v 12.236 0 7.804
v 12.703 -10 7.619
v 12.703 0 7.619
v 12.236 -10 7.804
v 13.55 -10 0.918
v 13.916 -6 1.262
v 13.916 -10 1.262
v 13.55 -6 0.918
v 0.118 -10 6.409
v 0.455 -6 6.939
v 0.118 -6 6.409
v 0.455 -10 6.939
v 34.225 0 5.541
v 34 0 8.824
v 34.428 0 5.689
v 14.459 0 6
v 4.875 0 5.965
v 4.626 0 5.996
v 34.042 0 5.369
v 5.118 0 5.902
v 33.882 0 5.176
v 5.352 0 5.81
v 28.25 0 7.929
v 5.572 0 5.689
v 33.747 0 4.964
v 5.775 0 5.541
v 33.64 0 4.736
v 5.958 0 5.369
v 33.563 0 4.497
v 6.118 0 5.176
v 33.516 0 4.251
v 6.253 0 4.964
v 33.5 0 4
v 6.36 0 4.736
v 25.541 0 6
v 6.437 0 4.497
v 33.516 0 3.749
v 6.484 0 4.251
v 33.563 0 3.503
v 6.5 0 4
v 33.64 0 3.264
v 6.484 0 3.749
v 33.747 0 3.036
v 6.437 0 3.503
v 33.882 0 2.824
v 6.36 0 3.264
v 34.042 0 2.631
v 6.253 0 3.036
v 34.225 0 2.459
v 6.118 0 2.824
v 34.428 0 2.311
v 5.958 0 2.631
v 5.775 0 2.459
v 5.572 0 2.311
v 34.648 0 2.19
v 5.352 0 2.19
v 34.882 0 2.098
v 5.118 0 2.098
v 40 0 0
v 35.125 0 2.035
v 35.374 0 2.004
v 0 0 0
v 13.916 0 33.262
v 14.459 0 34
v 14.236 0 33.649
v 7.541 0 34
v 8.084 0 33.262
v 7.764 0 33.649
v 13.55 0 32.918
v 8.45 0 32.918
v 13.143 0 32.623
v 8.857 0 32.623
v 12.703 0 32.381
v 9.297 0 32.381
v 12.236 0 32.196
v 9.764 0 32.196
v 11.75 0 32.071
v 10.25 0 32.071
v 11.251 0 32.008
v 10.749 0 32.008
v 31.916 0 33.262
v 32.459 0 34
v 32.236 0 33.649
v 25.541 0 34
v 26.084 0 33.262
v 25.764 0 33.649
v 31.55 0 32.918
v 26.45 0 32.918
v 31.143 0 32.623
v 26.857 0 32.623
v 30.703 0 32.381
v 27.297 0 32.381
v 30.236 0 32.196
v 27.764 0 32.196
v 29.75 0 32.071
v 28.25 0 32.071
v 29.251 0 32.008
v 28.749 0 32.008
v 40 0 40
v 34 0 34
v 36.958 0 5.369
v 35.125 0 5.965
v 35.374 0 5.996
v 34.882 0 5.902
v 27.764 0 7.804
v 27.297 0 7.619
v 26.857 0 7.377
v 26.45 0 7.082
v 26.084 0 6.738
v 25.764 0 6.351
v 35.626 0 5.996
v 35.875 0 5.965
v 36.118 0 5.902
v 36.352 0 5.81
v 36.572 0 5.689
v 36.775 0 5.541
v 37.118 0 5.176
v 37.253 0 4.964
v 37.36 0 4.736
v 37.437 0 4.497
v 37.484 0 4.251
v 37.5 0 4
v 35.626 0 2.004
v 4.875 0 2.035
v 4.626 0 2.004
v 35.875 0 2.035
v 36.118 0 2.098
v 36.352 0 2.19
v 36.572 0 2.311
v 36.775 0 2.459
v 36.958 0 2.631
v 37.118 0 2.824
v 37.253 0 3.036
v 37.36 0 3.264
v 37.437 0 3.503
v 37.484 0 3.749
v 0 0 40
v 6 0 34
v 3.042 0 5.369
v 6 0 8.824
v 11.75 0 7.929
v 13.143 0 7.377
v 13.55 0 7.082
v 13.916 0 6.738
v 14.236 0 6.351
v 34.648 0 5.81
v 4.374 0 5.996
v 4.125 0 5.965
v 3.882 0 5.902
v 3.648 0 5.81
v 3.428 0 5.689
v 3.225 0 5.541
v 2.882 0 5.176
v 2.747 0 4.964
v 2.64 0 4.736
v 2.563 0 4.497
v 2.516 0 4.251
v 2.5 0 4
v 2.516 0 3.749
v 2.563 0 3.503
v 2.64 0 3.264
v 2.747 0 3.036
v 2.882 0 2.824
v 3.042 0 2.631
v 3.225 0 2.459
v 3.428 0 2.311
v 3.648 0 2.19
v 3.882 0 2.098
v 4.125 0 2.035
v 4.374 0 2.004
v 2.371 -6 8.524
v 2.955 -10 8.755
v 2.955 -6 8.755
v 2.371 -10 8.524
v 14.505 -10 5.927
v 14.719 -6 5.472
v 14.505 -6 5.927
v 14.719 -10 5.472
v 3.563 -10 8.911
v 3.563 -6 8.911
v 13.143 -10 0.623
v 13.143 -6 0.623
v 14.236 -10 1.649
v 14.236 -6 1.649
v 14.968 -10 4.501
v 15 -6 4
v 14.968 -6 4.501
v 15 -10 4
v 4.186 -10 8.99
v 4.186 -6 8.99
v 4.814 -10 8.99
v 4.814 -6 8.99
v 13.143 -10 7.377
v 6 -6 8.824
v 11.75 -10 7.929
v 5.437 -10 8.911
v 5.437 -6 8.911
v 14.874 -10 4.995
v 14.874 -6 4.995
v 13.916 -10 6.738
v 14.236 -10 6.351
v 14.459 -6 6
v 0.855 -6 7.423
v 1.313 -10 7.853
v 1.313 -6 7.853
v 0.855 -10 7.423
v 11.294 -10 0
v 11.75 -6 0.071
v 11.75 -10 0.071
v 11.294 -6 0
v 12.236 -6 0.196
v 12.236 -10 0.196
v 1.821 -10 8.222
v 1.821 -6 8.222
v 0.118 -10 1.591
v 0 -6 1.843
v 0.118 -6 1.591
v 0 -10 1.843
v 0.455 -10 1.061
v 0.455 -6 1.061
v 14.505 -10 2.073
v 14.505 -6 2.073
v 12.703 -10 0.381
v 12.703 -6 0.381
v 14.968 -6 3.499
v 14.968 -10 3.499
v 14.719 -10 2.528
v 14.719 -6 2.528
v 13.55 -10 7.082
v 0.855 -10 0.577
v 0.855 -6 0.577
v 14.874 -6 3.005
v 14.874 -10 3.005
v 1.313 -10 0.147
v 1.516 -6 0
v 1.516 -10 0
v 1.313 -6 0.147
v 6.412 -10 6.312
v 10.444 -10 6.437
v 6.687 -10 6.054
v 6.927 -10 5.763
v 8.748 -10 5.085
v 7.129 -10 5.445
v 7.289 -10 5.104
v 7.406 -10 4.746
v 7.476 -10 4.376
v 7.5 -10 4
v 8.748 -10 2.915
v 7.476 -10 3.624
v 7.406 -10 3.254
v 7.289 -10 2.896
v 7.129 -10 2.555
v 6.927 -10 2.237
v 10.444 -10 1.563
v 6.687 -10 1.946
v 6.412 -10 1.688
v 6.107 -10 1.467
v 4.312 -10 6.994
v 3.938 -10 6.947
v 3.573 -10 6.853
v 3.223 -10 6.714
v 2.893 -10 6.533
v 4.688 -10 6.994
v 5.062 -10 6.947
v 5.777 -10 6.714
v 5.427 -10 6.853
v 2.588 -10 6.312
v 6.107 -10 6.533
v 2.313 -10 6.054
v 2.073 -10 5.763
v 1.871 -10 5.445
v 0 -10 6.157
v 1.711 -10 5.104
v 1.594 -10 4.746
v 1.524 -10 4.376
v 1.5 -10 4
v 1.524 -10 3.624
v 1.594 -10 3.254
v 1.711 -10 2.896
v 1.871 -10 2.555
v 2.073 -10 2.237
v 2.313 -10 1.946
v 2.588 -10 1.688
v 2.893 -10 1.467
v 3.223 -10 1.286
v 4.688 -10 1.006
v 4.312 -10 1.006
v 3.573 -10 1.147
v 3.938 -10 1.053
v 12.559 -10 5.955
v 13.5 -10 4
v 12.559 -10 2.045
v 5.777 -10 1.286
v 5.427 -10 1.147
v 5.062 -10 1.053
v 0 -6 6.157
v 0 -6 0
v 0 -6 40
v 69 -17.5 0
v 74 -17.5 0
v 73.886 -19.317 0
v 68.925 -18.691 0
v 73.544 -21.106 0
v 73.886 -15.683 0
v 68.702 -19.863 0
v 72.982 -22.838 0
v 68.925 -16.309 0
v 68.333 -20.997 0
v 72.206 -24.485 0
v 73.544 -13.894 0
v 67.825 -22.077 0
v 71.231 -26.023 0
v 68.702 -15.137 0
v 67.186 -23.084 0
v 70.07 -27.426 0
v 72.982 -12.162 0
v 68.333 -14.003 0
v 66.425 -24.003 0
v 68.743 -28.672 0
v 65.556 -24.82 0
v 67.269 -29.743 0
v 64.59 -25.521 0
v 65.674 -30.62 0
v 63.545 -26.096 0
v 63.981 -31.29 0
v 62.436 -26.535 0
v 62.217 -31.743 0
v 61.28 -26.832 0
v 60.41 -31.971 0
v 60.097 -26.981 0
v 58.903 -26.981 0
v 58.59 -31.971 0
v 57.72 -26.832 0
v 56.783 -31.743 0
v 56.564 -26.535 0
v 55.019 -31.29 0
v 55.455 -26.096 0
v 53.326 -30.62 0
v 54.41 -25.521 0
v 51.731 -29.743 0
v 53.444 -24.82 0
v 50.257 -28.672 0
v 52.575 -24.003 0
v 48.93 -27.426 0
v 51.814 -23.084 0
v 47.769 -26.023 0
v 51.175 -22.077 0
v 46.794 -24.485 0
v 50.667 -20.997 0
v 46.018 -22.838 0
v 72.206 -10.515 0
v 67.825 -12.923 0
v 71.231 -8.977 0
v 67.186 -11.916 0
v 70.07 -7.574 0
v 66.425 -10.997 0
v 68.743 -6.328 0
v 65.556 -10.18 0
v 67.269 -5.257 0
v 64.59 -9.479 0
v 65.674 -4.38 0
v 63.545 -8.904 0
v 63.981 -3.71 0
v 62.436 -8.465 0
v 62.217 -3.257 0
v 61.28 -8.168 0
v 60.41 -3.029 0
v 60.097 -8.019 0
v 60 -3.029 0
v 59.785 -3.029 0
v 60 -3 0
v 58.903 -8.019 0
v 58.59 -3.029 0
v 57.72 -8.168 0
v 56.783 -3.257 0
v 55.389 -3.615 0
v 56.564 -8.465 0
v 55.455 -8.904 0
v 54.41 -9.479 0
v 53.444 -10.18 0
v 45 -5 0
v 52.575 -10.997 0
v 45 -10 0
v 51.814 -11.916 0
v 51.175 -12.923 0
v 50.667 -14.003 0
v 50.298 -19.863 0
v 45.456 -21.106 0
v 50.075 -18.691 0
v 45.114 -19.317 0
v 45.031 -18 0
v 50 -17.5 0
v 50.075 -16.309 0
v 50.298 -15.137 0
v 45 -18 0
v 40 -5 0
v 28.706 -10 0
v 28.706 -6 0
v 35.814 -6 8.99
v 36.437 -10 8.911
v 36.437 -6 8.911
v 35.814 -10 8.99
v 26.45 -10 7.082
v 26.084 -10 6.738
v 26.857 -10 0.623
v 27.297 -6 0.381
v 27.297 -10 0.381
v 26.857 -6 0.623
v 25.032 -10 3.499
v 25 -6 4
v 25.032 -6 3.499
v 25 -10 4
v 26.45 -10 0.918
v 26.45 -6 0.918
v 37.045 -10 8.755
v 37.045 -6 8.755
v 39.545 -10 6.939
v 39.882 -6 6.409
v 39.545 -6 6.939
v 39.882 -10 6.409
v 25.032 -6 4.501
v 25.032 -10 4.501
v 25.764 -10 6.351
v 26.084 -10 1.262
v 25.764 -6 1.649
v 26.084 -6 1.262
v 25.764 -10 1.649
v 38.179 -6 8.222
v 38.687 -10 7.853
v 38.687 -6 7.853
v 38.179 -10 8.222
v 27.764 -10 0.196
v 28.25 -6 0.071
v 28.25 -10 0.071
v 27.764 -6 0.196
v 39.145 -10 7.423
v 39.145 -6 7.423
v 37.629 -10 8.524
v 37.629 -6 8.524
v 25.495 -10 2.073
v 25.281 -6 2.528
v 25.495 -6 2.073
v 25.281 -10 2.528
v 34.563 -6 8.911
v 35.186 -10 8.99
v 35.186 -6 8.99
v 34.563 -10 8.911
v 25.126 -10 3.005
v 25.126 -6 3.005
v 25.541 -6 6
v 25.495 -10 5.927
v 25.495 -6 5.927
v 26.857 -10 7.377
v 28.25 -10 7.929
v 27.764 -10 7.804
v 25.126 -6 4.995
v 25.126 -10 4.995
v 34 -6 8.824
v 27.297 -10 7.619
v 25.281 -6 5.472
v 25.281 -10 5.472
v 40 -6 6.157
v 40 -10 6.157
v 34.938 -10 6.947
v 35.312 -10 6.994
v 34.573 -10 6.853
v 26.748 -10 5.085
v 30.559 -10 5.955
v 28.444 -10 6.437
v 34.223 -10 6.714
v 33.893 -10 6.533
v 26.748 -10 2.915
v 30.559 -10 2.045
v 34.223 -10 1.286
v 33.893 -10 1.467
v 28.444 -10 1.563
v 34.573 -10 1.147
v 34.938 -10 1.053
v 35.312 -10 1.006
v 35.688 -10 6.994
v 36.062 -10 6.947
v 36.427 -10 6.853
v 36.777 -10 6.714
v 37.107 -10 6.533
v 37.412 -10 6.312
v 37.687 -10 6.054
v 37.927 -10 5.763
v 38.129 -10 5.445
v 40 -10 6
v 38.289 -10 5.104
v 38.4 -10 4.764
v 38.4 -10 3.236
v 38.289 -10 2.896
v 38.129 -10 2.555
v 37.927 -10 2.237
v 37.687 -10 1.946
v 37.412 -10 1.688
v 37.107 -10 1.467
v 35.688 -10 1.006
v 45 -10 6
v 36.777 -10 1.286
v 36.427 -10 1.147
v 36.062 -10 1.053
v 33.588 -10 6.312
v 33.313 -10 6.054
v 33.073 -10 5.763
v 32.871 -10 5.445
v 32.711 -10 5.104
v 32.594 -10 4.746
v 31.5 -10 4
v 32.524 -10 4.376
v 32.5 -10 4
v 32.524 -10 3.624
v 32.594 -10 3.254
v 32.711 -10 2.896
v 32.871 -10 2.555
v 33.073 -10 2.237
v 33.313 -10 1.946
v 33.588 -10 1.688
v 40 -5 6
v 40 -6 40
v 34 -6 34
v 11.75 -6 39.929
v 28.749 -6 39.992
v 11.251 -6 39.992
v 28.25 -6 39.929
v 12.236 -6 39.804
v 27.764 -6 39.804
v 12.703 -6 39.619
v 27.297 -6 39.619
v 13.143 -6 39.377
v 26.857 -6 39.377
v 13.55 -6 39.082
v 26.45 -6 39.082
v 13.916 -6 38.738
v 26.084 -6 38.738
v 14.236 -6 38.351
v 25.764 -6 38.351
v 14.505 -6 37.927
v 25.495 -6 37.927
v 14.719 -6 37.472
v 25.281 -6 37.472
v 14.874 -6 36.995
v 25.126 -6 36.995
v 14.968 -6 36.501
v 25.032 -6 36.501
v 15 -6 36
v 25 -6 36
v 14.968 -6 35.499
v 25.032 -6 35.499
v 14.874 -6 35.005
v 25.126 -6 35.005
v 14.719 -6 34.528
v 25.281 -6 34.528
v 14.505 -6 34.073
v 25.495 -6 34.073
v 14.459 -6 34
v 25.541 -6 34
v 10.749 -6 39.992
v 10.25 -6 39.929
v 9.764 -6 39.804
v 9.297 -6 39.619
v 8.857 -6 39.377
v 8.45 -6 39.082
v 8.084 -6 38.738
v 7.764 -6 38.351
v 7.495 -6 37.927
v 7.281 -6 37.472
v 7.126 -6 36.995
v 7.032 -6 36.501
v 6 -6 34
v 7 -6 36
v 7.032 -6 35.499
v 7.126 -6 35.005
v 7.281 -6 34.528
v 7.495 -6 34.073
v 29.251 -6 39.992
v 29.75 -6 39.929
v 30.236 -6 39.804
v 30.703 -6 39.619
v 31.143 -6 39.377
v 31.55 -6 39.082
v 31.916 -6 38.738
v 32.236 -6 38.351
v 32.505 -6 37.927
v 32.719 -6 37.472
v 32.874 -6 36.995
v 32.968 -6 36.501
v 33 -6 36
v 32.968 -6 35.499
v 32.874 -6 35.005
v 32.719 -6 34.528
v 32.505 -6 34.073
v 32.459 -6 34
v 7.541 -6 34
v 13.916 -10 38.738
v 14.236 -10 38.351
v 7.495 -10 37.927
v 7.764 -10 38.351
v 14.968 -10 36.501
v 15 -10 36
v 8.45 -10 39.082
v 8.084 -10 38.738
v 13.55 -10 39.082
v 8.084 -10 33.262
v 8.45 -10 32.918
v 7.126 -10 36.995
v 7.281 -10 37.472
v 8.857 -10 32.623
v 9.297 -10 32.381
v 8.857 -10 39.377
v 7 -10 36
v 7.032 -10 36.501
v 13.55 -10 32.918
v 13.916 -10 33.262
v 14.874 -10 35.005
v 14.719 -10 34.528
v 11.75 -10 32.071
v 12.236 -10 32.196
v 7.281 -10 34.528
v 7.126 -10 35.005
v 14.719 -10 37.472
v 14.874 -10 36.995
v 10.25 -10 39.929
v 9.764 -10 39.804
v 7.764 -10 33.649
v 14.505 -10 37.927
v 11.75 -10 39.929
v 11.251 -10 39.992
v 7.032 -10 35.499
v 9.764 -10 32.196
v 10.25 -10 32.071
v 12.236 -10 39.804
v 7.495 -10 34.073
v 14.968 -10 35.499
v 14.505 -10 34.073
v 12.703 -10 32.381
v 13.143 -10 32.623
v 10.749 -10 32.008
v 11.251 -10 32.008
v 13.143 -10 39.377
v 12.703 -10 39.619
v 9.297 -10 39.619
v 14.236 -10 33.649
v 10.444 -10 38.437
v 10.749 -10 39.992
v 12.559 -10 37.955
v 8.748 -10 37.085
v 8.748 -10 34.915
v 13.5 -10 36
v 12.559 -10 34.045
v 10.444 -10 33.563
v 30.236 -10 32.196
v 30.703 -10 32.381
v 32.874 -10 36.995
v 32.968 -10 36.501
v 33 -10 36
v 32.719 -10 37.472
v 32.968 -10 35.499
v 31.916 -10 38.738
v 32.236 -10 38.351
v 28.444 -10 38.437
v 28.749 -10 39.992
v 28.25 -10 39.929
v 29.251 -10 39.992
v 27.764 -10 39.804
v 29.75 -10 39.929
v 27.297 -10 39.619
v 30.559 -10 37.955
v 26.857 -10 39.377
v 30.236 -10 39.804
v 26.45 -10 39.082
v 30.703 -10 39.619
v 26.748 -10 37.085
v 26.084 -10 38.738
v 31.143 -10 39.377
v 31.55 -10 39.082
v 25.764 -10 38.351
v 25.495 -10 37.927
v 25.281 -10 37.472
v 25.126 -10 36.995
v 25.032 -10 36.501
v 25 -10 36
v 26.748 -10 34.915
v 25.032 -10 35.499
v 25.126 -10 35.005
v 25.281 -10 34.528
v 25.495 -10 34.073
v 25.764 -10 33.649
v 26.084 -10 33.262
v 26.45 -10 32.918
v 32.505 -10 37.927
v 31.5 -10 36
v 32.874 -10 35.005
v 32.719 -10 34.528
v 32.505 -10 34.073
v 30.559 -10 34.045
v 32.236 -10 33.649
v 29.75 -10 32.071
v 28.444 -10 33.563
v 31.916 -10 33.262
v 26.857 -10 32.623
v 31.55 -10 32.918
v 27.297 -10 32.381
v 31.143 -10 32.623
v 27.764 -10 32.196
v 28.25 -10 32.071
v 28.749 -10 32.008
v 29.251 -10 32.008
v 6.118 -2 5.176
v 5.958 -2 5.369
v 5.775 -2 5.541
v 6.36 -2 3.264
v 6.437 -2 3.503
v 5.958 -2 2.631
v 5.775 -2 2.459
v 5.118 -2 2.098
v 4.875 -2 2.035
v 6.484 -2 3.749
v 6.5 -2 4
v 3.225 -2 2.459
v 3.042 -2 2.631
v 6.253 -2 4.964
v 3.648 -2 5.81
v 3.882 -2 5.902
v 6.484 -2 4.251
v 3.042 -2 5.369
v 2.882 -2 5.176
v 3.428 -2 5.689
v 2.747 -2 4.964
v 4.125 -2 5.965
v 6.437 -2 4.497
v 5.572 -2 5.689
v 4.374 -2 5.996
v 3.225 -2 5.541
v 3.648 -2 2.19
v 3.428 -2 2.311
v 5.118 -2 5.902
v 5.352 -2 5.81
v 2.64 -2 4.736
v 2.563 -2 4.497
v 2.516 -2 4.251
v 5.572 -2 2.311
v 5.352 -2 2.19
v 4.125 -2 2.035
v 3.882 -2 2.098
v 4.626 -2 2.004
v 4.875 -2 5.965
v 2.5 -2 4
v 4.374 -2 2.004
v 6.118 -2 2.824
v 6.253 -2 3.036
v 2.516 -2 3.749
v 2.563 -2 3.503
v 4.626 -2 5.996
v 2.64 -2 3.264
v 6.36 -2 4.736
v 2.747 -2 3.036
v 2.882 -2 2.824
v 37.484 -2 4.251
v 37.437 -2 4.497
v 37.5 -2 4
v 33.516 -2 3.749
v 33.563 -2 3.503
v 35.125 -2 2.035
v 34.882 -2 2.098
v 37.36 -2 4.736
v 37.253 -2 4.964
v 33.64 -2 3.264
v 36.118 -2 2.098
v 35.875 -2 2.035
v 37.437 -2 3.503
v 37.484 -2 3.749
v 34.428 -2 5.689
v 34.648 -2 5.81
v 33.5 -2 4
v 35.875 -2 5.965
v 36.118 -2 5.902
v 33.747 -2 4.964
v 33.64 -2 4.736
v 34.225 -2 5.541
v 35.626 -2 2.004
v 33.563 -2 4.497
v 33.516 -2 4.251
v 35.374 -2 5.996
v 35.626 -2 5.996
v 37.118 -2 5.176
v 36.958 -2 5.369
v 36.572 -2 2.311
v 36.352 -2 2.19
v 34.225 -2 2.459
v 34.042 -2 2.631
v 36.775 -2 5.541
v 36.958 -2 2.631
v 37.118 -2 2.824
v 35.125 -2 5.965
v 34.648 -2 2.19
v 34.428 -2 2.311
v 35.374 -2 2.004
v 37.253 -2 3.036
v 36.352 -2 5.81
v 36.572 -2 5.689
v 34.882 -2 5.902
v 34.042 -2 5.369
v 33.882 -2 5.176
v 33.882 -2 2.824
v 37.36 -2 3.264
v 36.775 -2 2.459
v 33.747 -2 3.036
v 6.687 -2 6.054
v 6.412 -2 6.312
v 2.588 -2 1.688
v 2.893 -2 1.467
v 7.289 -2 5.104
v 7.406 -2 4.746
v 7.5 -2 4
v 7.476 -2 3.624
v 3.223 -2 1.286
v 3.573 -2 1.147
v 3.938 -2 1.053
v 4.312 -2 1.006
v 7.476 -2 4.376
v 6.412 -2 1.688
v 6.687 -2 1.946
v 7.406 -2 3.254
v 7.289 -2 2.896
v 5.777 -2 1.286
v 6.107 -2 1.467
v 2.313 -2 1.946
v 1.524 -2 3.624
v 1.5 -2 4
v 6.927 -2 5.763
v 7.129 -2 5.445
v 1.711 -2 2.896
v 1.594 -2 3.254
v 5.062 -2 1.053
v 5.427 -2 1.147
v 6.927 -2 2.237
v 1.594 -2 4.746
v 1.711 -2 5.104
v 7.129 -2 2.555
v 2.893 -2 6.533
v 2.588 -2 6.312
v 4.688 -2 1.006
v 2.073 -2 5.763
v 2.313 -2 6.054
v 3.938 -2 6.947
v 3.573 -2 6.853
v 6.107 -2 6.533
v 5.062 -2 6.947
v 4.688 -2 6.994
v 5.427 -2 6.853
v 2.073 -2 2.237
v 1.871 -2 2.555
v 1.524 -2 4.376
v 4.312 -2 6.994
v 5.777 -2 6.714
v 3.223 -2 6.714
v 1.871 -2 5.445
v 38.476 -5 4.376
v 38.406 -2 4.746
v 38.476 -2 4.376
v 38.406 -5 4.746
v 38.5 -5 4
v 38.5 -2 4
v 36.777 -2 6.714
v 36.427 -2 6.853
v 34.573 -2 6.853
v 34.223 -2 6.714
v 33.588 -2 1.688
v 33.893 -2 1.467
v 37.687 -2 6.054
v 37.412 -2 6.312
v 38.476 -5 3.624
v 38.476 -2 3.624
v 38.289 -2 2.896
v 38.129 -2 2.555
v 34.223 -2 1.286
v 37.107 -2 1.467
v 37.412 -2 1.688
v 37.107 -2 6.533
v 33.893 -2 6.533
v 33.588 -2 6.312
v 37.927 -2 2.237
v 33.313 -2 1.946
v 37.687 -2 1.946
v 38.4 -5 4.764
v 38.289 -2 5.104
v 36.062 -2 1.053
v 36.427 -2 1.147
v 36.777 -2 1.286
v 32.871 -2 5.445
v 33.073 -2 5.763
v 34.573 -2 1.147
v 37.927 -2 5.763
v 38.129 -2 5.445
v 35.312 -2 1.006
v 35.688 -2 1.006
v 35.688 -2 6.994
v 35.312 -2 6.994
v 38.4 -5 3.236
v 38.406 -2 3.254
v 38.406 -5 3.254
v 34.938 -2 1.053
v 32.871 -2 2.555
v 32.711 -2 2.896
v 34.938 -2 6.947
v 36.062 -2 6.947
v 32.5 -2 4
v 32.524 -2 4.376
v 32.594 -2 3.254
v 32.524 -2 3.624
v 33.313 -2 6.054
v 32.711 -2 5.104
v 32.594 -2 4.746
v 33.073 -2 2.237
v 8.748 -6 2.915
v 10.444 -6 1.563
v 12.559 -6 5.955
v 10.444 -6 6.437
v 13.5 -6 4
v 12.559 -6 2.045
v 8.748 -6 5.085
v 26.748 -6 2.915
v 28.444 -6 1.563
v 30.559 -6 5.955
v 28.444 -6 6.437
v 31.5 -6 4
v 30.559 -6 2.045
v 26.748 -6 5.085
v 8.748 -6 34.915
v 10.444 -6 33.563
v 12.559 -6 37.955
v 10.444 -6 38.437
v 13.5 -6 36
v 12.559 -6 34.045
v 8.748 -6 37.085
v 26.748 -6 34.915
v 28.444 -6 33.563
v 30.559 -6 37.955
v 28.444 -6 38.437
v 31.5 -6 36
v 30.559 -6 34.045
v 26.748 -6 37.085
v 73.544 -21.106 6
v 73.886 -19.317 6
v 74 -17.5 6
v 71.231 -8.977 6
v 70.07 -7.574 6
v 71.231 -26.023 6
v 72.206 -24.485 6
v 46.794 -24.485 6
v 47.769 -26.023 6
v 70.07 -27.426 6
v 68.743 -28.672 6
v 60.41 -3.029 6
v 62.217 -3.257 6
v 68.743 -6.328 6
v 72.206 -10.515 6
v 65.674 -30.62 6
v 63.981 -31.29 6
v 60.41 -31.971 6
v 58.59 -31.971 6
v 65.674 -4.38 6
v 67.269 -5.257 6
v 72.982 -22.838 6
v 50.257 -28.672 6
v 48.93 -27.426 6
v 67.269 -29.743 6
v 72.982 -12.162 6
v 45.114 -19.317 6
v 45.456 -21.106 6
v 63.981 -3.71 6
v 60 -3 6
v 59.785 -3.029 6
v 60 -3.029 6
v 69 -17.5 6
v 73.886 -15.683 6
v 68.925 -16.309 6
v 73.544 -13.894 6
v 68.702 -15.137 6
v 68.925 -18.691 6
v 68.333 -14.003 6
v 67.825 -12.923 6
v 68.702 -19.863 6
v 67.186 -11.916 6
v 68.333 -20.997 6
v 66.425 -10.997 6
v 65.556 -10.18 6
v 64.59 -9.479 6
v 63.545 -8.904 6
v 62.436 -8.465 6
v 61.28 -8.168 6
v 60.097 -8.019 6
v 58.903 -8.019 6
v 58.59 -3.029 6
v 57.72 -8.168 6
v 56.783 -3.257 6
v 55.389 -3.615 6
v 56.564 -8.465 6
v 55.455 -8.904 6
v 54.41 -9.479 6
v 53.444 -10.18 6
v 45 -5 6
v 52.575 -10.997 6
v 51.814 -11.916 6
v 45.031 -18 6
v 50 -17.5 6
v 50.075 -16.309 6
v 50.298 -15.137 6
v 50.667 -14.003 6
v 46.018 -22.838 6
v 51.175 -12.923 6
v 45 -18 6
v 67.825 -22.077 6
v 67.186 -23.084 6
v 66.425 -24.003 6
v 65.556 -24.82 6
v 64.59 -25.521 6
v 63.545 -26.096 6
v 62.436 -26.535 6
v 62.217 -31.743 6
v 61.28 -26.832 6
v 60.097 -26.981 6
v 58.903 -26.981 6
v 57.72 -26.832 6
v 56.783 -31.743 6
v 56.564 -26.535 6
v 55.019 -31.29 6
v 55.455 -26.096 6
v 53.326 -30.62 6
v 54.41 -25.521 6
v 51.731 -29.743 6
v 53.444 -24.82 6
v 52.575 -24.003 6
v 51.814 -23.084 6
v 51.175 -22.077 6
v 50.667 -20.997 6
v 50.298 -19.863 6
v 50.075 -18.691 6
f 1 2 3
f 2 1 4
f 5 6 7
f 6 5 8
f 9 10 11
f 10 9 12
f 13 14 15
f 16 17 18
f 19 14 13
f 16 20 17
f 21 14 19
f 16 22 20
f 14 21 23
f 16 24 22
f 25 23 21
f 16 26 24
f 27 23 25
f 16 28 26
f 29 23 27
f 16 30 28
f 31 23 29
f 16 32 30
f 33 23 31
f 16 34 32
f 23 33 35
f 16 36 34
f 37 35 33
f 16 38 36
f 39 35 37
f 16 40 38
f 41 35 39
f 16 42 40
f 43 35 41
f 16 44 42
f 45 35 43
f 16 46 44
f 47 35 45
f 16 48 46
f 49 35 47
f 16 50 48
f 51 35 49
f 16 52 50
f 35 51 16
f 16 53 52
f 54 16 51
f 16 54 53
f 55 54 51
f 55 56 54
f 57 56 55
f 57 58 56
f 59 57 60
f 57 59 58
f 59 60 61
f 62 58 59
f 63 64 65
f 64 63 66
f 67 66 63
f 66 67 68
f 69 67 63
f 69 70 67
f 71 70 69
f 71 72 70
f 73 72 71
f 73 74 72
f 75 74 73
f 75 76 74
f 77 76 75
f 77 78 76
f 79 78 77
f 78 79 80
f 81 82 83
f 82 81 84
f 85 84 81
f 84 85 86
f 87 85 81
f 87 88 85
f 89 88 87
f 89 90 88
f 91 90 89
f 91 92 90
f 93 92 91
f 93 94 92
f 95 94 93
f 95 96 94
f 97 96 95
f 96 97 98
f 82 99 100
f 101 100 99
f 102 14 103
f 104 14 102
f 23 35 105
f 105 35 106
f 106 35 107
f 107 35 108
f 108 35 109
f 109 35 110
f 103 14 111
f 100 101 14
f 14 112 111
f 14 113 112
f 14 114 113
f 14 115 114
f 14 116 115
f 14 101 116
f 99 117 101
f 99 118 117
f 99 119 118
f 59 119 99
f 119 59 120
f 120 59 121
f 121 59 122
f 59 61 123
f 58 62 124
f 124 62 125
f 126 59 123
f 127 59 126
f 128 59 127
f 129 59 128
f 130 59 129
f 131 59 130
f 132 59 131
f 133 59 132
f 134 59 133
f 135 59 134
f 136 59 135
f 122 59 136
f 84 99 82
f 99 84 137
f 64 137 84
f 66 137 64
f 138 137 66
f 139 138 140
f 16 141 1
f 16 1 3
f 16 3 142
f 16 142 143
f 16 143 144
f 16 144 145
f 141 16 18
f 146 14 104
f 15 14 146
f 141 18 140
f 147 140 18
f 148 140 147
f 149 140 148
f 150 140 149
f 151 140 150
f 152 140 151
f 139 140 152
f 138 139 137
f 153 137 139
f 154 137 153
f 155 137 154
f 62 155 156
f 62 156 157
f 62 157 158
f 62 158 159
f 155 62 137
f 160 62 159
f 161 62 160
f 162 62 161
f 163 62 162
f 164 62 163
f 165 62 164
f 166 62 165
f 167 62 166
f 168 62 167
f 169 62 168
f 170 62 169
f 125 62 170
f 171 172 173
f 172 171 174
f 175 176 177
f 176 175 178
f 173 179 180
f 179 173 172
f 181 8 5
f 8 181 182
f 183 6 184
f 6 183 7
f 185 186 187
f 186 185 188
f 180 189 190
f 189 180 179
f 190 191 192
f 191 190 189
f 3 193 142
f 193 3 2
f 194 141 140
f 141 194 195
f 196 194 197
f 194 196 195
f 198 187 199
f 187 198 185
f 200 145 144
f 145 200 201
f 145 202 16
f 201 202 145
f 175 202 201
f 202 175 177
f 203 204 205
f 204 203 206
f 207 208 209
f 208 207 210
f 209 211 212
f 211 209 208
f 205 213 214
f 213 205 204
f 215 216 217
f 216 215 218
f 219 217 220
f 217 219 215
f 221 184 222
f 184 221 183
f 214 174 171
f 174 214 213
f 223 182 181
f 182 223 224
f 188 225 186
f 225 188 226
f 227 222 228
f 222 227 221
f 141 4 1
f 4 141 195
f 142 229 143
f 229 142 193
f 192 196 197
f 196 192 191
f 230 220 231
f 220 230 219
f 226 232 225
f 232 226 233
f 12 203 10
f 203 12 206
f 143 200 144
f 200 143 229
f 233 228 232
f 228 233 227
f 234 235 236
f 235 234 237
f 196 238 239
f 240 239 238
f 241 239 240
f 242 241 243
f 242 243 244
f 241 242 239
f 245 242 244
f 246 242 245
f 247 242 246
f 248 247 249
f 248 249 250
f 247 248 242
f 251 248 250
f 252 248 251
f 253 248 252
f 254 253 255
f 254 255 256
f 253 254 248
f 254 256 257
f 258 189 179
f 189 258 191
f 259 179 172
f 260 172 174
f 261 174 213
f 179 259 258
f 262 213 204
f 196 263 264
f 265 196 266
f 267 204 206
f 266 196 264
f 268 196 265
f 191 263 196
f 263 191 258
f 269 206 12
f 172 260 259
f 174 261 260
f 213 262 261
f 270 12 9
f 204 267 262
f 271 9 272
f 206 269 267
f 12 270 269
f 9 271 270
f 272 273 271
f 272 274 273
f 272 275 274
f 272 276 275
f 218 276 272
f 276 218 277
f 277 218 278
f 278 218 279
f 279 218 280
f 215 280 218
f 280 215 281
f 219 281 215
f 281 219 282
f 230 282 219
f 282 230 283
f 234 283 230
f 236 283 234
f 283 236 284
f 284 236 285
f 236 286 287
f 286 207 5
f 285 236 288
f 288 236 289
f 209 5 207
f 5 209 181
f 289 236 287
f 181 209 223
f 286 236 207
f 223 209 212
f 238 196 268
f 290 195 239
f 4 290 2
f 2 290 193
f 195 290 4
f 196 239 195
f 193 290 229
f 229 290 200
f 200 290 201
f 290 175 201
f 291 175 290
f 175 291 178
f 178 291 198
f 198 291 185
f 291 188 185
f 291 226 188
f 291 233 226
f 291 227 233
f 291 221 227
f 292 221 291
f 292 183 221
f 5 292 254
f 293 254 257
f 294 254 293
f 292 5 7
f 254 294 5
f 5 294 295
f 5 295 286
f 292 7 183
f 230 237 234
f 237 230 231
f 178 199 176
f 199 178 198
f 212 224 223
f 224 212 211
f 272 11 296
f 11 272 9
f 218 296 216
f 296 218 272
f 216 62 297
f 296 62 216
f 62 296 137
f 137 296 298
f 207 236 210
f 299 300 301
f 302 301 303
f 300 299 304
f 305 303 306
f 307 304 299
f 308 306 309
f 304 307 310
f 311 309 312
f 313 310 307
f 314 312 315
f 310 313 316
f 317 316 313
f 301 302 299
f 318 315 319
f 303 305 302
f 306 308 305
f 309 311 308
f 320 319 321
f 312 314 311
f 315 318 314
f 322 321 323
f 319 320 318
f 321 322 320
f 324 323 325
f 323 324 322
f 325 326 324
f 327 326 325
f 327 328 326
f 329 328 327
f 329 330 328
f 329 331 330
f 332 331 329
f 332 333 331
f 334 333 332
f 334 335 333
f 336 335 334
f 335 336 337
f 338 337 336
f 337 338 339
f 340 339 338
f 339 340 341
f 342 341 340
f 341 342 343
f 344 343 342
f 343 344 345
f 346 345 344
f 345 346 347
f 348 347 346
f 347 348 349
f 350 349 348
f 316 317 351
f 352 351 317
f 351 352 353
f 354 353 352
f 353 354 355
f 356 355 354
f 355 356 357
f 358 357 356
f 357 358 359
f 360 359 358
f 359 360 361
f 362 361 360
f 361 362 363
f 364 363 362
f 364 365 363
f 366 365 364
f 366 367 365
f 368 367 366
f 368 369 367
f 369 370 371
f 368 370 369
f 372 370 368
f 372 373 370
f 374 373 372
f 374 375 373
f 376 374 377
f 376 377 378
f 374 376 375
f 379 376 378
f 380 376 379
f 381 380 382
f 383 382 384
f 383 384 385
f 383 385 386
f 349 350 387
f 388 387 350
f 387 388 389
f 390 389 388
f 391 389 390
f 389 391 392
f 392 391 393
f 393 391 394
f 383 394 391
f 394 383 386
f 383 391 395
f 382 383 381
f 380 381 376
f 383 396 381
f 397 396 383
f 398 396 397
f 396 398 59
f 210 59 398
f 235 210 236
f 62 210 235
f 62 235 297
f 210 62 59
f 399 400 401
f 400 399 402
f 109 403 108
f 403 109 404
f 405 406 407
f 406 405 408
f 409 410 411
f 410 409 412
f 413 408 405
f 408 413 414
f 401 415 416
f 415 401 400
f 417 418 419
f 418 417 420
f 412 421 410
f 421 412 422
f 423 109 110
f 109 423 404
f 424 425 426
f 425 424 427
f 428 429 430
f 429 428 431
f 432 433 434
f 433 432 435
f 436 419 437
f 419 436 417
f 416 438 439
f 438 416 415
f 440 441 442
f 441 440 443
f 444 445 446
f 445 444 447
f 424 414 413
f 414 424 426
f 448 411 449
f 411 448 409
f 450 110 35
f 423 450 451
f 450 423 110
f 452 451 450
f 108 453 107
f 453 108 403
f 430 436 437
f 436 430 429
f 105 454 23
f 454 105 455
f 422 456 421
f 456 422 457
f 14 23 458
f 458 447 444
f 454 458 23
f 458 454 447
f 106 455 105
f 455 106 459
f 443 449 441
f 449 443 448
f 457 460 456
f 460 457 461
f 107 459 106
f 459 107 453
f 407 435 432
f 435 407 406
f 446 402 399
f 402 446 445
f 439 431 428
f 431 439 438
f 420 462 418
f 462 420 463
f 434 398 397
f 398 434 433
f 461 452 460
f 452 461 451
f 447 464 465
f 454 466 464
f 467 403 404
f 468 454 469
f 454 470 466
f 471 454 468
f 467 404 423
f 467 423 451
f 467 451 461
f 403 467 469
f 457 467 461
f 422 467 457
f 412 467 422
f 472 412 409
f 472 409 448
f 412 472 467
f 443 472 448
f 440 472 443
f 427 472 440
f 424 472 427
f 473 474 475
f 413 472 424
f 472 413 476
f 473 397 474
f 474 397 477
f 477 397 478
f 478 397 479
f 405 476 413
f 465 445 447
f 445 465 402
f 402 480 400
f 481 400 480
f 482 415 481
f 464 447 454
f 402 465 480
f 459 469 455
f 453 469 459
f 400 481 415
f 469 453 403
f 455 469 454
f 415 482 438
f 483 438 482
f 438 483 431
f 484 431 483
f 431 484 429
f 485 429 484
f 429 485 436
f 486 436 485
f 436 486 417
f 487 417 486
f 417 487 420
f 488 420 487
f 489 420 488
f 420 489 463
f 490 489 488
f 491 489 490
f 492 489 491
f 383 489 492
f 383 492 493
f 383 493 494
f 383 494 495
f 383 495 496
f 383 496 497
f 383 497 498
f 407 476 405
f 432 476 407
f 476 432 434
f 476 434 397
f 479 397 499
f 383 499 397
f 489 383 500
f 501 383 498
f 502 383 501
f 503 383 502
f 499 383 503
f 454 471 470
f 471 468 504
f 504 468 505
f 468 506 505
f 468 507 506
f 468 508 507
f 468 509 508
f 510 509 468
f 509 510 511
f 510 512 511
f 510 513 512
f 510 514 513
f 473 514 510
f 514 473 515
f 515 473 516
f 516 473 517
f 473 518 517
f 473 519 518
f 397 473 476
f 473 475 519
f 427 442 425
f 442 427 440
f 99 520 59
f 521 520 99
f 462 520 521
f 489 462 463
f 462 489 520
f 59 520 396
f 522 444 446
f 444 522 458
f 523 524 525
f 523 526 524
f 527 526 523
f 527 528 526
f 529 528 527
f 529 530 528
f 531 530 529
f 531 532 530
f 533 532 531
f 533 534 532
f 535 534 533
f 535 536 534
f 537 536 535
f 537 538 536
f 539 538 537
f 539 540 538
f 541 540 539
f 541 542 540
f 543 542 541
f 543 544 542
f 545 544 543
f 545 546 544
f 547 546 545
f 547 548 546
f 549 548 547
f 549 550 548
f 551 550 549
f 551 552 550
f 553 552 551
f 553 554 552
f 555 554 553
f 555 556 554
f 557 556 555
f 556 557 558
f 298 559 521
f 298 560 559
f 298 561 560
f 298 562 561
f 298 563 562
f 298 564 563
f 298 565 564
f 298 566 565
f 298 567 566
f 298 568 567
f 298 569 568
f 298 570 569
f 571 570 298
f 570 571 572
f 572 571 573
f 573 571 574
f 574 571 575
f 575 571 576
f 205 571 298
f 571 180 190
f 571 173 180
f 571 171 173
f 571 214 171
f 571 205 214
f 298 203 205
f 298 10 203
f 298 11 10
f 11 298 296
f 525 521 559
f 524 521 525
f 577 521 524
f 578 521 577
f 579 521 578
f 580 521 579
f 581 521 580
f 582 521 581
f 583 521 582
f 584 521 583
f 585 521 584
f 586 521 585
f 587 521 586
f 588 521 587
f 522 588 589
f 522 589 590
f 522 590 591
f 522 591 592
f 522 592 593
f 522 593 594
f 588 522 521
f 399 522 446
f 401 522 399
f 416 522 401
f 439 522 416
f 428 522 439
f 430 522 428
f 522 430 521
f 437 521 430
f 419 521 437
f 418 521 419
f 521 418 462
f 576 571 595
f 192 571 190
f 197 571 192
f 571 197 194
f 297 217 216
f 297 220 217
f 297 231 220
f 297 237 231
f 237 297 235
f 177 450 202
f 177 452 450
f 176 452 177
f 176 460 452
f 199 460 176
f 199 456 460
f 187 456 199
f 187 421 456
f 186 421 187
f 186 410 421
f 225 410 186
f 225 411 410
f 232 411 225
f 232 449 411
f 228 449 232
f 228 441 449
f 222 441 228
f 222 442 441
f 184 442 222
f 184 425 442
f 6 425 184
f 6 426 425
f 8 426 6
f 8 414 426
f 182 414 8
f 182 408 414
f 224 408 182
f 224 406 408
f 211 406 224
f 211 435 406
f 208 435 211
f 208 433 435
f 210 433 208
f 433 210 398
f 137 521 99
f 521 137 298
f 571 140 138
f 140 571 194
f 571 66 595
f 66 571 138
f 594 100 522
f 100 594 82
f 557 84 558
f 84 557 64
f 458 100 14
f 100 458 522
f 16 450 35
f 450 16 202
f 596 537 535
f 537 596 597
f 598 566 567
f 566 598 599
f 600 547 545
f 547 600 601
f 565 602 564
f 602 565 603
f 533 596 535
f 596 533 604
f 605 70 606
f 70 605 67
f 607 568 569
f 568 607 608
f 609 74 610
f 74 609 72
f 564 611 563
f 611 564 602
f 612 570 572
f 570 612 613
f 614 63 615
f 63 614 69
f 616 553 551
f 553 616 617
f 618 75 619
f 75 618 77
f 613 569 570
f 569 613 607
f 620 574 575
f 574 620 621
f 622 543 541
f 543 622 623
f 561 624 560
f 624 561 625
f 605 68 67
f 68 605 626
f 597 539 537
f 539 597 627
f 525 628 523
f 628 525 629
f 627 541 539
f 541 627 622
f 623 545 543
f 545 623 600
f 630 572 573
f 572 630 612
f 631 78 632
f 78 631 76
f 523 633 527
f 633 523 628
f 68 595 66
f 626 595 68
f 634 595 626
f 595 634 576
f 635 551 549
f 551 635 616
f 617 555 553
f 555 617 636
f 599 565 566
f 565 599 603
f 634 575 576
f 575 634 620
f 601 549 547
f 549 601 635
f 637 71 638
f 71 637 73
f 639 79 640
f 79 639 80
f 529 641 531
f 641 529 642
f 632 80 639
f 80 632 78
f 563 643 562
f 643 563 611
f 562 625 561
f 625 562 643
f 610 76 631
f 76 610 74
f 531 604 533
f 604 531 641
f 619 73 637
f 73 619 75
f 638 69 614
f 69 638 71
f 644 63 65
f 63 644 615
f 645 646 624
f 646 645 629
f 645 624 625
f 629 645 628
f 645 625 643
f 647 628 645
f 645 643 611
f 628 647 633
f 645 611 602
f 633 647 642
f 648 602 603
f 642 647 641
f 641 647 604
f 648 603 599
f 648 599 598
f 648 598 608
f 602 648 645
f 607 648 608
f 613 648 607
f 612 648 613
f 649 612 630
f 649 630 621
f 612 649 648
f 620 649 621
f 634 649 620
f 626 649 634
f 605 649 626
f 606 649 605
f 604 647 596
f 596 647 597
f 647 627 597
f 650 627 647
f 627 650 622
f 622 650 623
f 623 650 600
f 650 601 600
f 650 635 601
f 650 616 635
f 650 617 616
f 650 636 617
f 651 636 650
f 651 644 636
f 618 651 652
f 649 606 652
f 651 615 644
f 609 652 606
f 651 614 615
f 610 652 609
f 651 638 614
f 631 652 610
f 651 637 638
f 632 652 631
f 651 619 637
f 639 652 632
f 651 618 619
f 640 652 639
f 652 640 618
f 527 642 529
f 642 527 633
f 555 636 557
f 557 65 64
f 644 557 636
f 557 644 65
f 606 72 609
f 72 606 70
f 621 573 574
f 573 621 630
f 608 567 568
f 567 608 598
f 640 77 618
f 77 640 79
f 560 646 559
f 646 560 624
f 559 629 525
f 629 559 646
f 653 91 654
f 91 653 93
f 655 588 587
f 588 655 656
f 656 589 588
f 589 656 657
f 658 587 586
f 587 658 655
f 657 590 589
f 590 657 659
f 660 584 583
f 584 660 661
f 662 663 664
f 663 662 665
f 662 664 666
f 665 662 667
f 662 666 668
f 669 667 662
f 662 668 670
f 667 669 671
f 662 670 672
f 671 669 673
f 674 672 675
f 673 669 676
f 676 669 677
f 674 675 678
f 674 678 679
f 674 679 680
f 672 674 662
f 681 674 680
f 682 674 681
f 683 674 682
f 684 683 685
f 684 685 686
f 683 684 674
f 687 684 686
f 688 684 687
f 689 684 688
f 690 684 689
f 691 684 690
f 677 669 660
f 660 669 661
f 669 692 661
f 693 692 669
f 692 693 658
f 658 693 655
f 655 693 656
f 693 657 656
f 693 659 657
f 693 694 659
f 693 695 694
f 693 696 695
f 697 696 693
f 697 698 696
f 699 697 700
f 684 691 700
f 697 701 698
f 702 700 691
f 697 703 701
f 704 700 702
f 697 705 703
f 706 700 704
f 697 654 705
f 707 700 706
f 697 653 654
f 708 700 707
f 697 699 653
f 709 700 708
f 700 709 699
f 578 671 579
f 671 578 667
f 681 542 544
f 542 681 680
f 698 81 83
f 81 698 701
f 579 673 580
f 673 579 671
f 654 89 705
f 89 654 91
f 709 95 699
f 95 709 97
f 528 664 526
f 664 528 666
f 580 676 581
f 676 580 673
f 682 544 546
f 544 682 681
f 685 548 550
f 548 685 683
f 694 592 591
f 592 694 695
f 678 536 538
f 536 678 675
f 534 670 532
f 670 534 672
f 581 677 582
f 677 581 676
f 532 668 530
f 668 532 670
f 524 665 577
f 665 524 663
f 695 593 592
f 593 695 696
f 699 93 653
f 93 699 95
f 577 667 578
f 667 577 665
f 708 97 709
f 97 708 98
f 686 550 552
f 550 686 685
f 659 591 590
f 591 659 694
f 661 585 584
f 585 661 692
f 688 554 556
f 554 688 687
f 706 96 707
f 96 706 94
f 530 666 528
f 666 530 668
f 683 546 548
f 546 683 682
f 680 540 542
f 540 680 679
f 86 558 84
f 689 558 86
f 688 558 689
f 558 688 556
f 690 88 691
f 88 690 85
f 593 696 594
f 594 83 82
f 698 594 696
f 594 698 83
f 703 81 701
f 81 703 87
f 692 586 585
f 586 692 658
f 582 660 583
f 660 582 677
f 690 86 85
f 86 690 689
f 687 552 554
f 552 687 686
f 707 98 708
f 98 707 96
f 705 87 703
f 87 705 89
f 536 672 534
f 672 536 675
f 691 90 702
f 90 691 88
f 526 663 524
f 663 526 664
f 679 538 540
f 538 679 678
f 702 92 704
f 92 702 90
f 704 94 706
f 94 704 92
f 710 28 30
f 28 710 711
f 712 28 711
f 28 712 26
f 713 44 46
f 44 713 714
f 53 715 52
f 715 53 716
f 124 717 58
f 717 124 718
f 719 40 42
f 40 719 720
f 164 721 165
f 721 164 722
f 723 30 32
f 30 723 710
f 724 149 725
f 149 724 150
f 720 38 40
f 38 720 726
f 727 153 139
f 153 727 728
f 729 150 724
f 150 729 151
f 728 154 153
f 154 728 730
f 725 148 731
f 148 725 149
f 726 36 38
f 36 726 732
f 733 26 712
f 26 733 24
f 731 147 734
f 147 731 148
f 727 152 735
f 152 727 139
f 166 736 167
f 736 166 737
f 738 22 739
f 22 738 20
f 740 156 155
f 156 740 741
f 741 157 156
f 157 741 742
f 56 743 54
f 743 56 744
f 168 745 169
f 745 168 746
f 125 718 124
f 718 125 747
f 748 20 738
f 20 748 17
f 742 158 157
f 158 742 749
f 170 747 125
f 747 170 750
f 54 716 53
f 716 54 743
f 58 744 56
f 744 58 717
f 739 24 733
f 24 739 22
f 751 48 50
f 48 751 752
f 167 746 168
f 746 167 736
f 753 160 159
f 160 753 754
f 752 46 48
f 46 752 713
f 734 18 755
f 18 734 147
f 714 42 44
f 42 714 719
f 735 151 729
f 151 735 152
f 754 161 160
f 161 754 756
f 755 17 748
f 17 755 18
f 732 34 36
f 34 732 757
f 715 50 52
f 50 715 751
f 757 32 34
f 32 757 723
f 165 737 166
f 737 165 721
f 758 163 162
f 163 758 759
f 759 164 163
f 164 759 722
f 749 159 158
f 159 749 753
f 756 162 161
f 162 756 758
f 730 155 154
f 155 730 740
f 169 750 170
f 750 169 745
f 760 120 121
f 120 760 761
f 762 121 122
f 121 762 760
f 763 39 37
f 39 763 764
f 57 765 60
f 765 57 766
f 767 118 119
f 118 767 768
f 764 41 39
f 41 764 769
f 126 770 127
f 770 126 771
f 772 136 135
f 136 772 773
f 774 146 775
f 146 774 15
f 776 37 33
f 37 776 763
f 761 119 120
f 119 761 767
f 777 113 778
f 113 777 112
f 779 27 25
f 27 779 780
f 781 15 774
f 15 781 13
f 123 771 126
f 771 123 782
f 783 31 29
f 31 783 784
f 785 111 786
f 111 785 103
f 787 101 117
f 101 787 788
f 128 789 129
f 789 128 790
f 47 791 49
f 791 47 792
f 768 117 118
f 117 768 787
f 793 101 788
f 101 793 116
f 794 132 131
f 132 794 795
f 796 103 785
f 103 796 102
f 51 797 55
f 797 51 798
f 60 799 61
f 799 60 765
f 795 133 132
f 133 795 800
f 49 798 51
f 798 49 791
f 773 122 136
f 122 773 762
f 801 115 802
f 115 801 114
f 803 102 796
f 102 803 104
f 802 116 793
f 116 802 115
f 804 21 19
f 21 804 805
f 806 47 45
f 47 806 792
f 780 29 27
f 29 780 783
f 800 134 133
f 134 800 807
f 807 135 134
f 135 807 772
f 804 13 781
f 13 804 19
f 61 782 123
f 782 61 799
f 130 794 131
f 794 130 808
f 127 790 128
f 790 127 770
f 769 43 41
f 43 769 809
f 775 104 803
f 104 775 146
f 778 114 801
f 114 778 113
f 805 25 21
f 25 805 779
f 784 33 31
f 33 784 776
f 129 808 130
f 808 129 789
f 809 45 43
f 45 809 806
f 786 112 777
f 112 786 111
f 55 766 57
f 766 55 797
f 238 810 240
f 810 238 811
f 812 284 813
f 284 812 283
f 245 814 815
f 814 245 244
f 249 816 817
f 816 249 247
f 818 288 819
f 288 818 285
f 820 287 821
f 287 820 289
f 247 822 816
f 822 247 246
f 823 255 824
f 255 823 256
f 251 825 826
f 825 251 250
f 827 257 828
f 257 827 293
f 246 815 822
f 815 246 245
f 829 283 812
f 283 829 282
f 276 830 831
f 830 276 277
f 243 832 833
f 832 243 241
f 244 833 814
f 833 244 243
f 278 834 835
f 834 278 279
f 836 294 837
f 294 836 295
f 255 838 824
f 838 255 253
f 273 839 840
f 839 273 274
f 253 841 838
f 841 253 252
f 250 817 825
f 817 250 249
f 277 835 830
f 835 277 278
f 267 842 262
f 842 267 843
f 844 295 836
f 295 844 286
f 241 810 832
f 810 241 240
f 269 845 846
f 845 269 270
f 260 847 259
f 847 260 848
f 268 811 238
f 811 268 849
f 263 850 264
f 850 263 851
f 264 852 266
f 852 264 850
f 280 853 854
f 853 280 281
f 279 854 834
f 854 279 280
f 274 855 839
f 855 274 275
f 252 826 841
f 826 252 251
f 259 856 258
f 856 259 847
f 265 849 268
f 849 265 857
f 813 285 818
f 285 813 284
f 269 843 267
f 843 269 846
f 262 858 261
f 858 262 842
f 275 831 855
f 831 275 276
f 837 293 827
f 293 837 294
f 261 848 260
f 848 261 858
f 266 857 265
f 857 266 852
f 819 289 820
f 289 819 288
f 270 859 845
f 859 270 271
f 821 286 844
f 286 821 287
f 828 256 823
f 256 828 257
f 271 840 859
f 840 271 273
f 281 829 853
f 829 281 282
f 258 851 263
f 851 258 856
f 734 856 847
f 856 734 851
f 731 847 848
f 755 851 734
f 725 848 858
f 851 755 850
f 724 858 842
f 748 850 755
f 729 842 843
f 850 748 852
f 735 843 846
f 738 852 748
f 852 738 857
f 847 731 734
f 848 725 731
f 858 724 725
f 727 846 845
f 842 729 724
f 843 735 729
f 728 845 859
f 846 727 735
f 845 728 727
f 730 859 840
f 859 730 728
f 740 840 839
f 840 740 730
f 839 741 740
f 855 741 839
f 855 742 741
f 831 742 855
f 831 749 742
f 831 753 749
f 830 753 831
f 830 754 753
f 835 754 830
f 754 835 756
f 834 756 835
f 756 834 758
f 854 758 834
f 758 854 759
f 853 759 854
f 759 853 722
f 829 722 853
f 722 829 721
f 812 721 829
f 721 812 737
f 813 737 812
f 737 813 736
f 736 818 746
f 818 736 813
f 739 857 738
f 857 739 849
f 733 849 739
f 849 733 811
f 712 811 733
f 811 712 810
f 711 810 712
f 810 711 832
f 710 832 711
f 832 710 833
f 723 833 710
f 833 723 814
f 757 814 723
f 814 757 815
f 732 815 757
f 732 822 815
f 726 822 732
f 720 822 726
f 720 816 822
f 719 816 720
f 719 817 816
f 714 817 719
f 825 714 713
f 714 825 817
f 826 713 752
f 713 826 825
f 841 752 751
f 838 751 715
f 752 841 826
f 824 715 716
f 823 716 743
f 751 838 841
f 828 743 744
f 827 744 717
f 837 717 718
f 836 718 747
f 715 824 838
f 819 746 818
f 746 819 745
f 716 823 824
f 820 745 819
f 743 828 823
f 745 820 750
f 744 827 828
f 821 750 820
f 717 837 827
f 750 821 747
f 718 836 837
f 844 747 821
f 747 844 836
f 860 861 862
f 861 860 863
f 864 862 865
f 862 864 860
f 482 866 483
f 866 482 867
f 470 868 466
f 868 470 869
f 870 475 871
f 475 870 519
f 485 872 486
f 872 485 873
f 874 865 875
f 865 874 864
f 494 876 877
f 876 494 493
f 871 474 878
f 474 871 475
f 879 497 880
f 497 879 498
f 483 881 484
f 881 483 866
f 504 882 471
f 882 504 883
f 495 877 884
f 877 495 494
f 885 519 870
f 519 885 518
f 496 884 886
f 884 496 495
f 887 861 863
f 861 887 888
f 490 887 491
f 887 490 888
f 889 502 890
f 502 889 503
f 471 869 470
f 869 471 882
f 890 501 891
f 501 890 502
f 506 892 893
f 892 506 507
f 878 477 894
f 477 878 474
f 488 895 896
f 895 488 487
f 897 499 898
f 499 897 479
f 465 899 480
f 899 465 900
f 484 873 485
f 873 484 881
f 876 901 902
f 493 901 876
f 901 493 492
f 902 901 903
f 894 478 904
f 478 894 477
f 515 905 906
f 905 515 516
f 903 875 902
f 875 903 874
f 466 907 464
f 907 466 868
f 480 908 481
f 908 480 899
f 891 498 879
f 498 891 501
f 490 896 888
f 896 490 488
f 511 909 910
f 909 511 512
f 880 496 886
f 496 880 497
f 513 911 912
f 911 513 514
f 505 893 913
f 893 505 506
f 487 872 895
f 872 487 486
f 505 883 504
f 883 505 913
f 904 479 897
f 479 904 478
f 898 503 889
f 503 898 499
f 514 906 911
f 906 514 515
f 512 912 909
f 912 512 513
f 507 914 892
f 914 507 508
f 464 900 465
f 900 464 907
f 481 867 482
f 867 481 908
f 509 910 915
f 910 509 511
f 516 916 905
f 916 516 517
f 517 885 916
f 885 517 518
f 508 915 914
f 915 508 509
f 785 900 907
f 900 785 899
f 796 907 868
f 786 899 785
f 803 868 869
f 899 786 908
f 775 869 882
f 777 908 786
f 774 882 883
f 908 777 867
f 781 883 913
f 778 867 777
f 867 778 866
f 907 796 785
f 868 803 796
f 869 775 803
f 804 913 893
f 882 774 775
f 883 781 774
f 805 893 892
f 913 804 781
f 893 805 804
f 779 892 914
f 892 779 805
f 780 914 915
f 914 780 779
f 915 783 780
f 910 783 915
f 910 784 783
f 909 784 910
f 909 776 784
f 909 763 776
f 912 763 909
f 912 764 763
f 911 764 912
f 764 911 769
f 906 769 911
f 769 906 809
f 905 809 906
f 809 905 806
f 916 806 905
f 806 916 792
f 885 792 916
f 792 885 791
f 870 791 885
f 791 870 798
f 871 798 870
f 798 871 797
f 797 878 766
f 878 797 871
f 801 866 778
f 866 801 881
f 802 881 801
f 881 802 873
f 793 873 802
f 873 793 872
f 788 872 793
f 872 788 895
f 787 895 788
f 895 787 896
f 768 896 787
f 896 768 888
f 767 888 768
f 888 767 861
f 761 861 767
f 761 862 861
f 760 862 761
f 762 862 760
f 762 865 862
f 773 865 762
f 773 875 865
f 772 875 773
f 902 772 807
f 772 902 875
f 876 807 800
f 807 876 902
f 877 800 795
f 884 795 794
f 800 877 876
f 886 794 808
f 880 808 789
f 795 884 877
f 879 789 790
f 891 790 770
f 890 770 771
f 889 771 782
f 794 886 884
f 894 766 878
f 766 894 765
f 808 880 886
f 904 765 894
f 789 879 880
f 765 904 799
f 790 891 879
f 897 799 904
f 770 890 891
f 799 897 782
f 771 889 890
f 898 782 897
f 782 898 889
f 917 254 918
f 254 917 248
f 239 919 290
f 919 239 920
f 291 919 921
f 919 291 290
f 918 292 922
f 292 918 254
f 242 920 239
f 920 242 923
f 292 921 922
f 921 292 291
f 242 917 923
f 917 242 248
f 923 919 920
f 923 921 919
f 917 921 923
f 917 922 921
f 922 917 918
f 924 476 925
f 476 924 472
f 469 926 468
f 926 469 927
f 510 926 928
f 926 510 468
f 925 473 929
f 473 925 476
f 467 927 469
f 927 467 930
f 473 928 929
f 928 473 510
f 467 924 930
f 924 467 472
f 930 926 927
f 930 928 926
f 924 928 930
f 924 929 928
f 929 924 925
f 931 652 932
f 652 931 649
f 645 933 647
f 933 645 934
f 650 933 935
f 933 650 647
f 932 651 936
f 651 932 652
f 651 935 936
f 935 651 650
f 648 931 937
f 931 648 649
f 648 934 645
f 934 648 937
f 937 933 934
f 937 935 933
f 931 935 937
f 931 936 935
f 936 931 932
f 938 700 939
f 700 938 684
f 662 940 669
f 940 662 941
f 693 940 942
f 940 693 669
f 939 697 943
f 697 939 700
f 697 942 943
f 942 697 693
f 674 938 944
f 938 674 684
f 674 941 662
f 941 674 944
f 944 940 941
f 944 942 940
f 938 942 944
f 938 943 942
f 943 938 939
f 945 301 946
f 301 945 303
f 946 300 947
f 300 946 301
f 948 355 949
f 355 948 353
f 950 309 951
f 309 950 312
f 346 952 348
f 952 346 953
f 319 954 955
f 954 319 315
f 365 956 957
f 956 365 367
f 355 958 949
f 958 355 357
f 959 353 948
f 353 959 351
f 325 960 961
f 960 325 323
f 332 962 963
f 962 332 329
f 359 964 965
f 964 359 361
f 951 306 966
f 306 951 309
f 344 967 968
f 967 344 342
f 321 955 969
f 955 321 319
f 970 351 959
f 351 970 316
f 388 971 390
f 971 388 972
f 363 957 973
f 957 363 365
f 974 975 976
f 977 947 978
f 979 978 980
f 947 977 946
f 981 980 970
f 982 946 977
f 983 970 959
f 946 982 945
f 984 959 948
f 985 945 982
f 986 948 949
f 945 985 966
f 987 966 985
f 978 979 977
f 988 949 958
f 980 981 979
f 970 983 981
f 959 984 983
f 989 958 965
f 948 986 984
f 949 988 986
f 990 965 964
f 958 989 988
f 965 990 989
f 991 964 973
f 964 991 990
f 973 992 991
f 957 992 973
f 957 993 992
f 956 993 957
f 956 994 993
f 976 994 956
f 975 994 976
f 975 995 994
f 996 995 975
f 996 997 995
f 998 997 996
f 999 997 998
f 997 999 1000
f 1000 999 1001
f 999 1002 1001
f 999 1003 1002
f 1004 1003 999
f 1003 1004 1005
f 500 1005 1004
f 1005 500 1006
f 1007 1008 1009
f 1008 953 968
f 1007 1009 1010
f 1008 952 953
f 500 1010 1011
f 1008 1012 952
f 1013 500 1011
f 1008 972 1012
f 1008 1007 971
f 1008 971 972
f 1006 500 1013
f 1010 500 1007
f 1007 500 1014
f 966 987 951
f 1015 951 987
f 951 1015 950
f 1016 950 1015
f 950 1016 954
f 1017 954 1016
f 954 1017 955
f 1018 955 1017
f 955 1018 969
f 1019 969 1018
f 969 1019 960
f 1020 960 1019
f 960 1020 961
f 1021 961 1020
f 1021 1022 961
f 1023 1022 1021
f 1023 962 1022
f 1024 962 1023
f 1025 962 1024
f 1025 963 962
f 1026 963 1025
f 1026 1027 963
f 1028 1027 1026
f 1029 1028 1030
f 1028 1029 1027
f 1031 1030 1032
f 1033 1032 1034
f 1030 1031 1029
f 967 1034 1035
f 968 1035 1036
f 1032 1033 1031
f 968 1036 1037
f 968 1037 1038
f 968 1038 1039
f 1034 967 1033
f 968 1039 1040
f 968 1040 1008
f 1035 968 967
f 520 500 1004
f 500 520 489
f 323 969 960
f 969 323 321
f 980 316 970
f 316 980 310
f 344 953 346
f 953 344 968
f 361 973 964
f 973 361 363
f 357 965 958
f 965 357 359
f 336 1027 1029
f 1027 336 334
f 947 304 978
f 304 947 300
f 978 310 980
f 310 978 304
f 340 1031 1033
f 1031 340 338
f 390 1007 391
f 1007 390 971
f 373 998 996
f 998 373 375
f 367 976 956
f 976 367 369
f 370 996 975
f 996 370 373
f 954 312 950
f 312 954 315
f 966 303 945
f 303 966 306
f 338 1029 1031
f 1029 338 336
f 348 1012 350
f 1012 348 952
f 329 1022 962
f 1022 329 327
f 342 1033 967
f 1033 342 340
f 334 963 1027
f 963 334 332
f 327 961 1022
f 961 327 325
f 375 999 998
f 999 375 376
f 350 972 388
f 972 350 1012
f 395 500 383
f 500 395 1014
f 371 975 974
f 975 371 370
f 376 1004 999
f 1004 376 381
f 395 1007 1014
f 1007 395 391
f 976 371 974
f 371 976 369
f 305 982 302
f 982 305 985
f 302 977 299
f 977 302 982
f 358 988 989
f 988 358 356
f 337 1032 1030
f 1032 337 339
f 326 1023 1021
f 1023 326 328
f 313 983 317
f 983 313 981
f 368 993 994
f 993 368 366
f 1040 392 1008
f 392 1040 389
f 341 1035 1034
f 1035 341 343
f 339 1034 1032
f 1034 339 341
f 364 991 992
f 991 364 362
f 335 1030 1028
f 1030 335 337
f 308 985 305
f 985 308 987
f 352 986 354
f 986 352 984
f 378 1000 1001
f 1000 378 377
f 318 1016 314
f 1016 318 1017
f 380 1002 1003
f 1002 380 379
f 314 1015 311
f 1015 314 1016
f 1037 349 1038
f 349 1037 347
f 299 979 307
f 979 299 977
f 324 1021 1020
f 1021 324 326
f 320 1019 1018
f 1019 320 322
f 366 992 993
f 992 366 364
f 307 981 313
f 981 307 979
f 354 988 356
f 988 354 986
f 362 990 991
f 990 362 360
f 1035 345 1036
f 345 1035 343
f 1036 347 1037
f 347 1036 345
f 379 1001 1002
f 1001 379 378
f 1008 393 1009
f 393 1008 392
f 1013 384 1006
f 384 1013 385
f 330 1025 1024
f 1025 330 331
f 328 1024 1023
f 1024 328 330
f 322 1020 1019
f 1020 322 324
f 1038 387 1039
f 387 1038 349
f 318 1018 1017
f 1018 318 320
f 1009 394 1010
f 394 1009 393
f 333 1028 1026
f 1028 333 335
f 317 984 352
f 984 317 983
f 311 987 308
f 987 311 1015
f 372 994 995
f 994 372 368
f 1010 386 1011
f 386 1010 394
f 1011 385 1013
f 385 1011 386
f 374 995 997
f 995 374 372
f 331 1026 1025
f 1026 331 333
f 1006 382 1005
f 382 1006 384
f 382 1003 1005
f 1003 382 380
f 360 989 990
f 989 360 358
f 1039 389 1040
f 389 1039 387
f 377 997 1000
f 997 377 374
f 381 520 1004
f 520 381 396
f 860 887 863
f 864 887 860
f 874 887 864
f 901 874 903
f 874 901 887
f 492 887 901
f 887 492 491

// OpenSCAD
inn_sq_h = 28;
inn_sq_w = 28;
inn_sq_x = 6;
inn_sq_y = 6;
screw1_offs = [4.5,4];
screw2_offs = [35.5,4];
mag1_offs = [11,4];
mag2_offs = [29,4];
mag3_offs = [11,36];
mag4_offs = [29,36];
mag_diam = 5;
probe_rad = 9.5;

rotate([90,0,0]) union() {
    difference() {
        union() {
            linear_extrude(6) {
                difference() {
                    square(40);
                    translate([inn_sq_x,inn_sq_y]) polygon([[0,0],[inn_sq_w, 0],[inn_sq_w,inn_sq_h],[0,inn_sq_h]]);
                };
            };
            // top magnets
            translate(mag3_offs) cylinder(10, d=(mag_diam+3), $fn=50);
            translate(mag4_offs) cylinder(10, d=(mag_diam+3), $fn=50);
            // screw holders
            intersection() {
                hull() {
                    translate(screw1_offs) cylinder(10, d=10, $fn=50);
                    translate(mag1_offs) cylinder(10, d=(mag_diam+3), $fn=50);
                };
                cube(40,40,10);
            };
            intersection() {
                hull() {
                    translate(screw2_offs) cylinder(10, d=10, $fn=50);
                    translate(mag2_offs) cylinder(10, d=(mag_diam+3), $fn=50);
                };
                cube(40,40,10);
            };
        };
        // screws
        translate(screw1_offs) cylinder(10, d=4, $fn=50);
        translate(screw2_offs) cylinder(10, d=4, $fn=50);
        translate(concat(screw1_offs, [2])) cylinder(8, d=6, $fn=50);
        translate(concat(screw2_offs, [2])) cylinder(8, d=6, $fn=50);
        // magnets
        translate(concat(mag1_offs,[6])) cylinder(4, d=mag_diam, $fn=7);
        translate(concat(mag2_offs,[6])) cylinder(4, d=mag_diam, $fn=7);
        translate(concat(mag3_offs,[6])) cylinder(4, d=mag_diam, $fn=7);
        translate(concat(mag4_offs,[6])) cylinder(4, d=mag_diam, $fn=7);
    };

    translate([38.4,0,5]) cube([7.6,6,5]);

    translate([45,6,3]) rotate([90,0,0]) {
        difference() {
            union() {
                translate([probe_rad+5,probe_rad+5]) cylinder(6, r=probe_rad+5, $fn=50);
                linear_extrude(6) polygon([[0,2],[15,0],[15,15],[0,15]]);
            };
        translate([probe_rad+5,probe_rad+5]) cylinder(6, r=probe_rad, $fn=50);
        };
    };
};
